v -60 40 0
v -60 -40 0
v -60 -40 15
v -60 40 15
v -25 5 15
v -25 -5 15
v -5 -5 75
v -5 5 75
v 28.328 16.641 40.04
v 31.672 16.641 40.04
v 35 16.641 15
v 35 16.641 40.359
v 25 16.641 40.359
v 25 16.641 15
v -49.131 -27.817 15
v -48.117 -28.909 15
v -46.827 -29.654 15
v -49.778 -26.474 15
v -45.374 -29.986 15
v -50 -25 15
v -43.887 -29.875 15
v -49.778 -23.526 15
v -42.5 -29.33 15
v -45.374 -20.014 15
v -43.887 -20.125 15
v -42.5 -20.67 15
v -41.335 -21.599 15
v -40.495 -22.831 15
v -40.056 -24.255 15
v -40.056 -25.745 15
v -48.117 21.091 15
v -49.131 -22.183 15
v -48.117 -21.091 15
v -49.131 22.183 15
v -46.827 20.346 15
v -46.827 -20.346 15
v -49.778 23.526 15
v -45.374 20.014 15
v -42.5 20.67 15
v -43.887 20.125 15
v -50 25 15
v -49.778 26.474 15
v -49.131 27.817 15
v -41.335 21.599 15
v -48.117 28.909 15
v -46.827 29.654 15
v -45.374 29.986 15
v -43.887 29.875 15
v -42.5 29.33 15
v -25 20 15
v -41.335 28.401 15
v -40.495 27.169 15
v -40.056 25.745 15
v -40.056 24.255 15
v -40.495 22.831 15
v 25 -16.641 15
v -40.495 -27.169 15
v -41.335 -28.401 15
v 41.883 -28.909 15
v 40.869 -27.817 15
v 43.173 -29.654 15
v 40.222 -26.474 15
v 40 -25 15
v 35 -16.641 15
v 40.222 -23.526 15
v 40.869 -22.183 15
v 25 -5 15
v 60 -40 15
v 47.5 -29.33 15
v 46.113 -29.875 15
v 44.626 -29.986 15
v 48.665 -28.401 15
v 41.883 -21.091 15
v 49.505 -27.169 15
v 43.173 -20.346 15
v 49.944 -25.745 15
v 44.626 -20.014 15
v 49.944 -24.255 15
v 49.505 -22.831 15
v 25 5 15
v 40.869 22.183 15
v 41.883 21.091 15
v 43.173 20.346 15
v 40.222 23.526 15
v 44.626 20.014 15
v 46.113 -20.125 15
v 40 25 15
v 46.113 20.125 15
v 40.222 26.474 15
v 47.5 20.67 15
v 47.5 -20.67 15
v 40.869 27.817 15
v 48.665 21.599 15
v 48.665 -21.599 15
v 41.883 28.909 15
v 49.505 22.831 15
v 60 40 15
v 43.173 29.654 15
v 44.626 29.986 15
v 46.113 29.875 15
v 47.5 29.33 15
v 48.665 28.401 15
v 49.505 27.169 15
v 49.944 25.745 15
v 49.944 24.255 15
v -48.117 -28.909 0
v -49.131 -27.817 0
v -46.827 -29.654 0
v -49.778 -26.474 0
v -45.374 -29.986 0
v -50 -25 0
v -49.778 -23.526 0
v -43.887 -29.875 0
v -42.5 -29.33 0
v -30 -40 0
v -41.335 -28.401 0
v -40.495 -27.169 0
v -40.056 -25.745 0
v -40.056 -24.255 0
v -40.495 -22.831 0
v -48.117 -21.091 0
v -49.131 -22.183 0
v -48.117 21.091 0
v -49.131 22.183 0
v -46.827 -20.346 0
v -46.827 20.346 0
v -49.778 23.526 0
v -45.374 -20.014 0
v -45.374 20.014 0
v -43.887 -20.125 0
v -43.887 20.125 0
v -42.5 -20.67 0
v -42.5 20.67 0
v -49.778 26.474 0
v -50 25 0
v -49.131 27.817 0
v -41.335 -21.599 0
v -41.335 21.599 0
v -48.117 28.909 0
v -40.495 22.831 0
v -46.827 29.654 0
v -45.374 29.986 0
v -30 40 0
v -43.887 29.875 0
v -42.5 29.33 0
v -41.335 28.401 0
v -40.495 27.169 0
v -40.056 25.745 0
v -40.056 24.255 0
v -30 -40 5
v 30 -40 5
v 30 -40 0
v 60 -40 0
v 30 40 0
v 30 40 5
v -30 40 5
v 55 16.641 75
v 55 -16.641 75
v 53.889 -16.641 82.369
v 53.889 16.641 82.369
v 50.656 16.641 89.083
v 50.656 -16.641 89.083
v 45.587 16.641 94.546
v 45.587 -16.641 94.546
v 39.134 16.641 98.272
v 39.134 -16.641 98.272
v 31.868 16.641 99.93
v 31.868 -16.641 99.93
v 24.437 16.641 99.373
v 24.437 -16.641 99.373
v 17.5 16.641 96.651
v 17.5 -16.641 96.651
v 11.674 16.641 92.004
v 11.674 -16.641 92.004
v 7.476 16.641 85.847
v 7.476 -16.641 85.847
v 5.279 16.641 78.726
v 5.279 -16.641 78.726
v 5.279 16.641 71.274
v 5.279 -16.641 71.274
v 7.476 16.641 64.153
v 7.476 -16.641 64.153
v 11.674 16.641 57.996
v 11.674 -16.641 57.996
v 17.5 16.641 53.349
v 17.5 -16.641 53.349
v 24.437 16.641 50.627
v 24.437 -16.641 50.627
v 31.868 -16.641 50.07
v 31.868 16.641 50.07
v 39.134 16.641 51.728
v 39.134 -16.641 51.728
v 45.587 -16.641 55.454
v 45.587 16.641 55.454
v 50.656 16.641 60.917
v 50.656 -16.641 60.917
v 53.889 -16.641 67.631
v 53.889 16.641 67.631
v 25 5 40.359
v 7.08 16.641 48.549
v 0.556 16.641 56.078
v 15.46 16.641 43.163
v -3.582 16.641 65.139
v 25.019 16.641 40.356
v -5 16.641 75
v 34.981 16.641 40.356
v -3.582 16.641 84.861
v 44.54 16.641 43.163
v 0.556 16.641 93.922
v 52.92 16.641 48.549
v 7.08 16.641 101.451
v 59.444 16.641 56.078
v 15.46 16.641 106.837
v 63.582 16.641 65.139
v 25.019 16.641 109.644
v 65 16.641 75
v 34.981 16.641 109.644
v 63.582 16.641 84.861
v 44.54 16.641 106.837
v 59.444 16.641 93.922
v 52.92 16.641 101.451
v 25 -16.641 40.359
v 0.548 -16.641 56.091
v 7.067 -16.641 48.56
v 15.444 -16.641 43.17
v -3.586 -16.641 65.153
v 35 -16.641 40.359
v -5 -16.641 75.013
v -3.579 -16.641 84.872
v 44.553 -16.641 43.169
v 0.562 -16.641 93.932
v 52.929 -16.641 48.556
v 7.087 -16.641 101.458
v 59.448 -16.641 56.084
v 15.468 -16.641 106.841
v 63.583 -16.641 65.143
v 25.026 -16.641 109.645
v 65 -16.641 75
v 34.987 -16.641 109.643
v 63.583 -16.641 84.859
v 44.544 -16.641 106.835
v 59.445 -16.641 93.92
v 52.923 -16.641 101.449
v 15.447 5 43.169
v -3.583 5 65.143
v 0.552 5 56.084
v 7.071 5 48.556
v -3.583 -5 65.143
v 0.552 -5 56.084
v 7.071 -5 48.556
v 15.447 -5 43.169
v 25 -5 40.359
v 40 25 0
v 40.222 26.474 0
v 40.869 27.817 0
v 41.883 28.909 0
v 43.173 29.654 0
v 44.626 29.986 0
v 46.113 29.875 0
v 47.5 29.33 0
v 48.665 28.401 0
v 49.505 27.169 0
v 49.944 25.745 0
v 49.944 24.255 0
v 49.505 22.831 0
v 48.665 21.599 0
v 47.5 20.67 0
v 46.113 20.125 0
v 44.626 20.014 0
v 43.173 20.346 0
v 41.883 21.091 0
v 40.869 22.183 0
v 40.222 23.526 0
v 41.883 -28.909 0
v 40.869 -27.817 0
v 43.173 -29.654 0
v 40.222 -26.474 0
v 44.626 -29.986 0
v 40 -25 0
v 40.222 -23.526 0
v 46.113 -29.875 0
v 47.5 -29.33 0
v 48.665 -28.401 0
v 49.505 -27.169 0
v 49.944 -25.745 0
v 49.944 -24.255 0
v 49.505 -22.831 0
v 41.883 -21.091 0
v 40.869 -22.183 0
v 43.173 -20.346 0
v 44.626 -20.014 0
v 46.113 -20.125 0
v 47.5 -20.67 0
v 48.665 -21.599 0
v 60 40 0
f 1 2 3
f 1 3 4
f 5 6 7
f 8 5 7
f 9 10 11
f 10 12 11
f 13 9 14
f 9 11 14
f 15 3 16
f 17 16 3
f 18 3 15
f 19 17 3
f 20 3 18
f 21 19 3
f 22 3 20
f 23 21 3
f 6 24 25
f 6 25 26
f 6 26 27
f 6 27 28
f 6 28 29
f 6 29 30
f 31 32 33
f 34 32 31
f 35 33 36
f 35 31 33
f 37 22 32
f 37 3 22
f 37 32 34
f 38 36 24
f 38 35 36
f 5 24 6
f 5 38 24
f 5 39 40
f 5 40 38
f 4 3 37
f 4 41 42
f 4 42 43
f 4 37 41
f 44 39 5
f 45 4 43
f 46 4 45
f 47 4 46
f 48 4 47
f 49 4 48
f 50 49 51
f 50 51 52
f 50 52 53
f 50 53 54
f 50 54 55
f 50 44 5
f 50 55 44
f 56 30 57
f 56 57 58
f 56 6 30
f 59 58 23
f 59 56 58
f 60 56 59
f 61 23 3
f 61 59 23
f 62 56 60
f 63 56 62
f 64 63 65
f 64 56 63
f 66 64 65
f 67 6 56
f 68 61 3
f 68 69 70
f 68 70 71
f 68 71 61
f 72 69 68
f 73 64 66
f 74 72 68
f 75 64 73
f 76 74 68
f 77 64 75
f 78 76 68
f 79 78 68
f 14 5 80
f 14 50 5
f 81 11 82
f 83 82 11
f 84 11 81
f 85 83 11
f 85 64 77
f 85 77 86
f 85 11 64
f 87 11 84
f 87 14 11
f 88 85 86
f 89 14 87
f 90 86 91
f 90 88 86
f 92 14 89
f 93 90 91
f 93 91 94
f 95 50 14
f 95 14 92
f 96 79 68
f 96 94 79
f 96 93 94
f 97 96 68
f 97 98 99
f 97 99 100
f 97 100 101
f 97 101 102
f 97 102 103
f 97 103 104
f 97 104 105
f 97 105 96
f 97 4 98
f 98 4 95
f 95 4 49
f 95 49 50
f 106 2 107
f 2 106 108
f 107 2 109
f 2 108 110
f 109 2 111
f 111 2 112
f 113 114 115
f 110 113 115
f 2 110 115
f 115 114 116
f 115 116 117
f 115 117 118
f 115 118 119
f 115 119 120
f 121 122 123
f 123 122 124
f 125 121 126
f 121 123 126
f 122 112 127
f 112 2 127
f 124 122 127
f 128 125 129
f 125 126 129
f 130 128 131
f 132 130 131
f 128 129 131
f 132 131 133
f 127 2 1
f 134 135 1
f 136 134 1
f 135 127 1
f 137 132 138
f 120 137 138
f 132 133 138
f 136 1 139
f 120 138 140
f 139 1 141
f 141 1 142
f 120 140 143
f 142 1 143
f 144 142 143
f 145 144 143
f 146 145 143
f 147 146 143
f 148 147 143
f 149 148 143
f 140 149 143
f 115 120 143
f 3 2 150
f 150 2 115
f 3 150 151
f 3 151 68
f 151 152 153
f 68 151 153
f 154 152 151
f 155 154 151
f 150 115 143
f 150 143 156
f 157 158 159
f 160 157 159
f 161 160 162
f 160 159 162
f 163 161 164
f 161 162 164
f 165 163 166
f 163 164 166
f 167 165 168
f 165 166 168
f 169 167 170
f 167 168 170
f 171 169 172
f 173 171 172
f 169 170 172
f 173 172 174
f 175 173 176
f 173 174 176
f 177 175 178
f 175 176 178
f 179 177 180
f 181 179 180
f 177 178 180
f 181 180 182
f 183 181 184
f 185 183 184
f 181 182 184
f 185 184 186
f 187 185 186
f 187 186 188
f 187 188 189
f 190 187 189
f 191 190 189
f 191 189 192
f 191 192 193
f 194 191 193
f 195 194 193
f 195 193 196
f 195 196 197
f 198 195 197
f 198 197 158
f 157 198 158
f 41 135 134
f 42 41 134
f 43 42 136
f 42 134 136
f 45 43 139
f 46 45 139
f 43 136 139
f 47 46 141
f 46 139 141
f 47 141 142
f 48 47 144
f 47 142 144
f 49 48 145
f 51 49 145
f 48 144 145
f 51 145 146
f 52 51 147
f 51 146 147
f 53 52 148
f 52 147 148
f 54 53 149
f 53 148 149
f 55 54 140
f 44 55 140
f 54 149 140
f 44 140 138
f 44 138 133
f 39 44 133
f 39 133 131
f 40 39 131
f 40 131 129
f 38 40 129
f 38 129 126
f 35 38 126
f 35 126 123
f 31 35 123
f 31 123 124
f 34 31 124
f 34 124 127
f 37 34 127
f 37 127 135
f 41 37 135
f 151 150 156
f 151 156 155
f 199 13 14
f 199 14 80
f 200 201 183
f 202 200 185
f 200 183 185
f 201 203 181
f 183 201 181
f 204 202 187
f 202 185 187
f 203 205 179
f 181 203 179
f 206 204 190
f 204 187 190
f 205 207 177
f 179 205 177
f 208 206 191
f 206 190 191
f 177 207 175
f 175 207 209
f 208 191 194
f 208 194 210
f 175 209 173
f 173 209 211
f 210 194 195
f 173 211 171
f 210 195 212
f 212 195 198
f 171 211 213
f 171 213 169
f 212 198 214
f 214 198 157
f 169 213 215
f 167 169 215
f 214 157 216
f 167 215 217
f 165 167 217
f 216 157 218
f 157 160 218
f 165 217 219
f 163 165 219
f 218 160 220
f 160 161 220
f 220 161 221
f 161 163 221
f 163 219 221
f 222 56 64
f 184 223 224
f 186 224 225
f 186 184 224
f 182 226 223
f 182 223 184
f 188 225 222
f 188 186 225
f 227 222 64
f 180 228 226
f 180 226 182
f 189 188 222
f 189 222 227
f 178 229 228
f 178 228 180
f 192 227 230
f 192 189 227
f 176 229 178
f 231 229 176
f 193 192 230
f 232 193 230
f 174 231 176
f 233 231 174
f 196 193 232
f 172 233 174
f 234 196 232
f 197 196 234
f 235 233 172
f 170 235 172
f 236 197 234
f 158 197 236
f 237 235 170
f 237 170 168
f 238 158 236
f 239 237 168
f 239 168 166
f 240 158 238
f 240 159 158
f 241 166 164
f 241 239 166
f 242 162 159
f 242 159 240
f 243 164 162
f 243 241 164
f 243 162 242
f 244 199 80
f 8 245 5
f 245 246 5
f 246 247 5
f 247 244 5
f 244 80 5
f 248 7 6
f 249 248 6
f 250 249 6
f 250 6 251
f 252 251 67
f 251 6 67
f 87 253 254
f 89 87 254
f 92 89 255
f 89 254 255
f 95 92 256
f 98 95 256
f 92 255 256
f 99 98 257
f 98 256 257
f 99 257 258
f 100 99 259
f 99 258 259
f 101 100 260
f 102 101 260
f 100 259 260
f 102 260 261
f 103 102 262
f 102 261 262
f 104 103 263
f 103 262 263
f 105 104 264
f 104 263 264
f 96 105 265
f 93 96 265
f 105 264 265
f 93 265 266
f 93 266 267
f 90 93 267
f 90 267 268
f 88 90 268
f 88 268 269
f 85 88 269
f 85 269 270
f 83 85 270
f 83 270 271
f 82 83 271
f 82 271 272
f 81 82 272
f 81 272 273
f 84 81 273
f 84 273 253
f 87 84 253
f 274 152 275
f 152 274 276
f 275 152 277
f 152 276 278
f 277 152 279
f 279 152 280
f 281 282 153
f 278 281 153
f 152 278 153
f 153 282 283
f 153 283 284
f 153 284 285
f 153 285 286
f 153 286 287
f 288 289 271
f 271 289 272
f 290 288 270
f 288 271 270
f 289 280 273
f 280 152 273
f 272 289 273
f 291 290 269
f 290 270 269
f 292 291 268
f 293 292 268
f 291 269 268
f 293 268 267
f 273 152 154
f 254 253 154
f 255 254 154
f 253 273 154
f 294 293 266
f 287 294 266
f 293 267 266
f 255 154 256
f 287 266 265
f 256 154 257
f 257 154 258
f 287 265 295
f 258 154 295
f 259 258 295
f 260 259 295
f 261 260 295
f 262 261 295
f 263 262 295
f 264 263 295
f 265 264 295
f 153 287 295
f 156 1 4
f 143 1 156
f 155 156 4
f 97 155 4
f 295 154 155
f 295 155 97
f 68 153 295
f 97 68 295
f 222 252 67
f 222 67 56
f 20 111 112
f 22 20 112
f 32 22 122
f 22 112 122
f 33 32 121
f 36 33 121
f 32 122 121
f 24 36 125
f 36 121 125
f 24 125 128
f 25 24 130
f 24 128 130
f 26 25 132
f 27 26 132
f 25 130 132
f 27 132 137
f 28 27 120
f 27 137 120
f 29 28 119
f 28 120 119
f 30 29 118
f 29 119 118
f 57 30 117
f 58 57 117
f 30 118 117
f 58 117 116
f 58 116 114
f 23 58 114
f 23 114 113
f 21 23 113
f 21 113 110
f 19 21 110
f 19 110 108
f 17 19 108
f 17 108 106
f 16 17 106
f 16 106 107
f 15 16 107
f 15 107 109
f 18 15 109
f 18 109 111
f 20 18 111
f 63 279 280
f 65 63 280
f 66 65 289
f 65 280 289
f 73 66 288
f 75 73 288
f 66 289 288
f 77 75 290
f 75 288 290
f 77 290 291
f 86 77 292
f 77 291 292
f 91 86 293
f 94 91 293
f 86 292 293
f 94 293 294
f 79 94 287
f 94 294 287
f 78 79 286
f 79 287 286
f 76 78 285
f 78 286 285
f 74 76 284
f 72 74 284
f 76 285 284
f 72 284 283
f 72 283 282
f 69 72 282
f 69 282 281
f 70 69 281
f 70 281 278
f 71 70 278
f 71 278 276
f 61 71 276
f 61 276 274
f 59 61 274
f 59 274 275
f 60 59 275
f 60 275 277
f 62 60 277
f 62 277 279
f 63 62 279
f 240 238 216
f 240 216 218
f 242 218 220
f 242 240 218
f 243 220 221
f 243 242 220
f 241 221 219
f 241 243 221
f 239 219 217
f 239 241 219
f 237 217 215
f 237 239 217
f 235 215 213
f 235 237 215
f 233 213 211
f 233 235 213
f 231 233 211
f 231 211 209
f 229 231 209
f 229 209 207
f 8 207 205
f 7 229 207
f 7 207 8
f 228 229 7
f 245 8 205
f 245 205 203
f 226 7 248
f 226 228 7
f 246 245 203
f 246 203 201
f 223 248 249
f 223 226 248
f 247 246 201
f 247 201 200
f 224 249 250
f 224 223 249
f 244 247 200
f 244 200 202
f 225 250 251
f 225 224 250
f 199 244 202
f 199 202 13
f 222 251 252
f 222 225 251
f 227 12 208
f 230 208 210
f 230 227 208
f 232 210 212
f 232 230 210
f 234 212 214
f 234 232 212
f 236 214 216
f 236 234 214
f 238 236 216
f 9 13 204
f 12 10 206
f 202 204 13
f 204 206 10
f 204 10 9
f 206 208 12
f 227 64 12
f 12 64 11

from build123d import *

# Parameters (mm, degrees)
F0_W      = 120
F0_H      = 80
F1_DEPTH  = 15
F2_W      = 60
F2_H      = 10
F3_DEPTH  = 80.001
F5_D      = 10
F7_DEPTH  = 60
F8_R      = 35
F9_DEPTH  = 33.282083
F10_R     = 25
F11_DEPTH = 56.642041
F13_DEPTH = 25


with BuildPart() as f1:
    # F0 (on Top) → F1 (new body)
    with BuildSketch(Plane.XY):
        Rectangle(F0_W, F0_H)
    extrude(amount=F1_DEPTH)

    # F2 (on face) → F3 (cut, through all)
    with BuildSketch(Plane.XZ.offset(40)):
        Rectangle(F2_W, F2_H)
    extrude(amount=-F3_DEPTH, mode=Mode.SUBTRACT)

    # F5 (through all)
    with Locations(Plane.XY.offset(15)):
        with Locations((-45, 25), (45, 25), (-45, -25), (45, -25)):
            Hole(F5_D / 2)

    # F6 (on face) → F7 (join)
    with BuildSketch(Plane.XY.offset(15)):
        Polygon((-25, -5), (25, -5), (25, -16.641041), (35, -16.641041), (35, -5), (35, 5), (35, 16.641041), (25, 16.641041), (25, 5), (-25, 5), align=None)
    extrude(amount=F7_DEPTH)

    # F8 (on face) → F9 (join, through all)
    with BuildSketch(Plane.XZ.offset(16.641041)):
        with Locations((30, 75)):
            Circle(F8_R)
    extrude(amount=-F9_DEPTH)

    # F10 (on face) → F11 (cut, through all)
    with BuildSketch(Plane.XZ.offset(16.641041)):
        with Locations((30, 75)):
            Circle(F10_R)
    extrude(amount=-F11_DEPTH, mode=Mode.SUBTRACT)

    # F12 (on face) → F13 (cut)
    with BuildSketch(Plane.XZ.offset(5)):
        Polygon((-25, 16.937228), (-25, 15), (-5, 75), (-25, 75), align=None)
    extrude(amount=-F13_DEPTH, mode=Mode.SUBTRACT)


solid = f1.part
